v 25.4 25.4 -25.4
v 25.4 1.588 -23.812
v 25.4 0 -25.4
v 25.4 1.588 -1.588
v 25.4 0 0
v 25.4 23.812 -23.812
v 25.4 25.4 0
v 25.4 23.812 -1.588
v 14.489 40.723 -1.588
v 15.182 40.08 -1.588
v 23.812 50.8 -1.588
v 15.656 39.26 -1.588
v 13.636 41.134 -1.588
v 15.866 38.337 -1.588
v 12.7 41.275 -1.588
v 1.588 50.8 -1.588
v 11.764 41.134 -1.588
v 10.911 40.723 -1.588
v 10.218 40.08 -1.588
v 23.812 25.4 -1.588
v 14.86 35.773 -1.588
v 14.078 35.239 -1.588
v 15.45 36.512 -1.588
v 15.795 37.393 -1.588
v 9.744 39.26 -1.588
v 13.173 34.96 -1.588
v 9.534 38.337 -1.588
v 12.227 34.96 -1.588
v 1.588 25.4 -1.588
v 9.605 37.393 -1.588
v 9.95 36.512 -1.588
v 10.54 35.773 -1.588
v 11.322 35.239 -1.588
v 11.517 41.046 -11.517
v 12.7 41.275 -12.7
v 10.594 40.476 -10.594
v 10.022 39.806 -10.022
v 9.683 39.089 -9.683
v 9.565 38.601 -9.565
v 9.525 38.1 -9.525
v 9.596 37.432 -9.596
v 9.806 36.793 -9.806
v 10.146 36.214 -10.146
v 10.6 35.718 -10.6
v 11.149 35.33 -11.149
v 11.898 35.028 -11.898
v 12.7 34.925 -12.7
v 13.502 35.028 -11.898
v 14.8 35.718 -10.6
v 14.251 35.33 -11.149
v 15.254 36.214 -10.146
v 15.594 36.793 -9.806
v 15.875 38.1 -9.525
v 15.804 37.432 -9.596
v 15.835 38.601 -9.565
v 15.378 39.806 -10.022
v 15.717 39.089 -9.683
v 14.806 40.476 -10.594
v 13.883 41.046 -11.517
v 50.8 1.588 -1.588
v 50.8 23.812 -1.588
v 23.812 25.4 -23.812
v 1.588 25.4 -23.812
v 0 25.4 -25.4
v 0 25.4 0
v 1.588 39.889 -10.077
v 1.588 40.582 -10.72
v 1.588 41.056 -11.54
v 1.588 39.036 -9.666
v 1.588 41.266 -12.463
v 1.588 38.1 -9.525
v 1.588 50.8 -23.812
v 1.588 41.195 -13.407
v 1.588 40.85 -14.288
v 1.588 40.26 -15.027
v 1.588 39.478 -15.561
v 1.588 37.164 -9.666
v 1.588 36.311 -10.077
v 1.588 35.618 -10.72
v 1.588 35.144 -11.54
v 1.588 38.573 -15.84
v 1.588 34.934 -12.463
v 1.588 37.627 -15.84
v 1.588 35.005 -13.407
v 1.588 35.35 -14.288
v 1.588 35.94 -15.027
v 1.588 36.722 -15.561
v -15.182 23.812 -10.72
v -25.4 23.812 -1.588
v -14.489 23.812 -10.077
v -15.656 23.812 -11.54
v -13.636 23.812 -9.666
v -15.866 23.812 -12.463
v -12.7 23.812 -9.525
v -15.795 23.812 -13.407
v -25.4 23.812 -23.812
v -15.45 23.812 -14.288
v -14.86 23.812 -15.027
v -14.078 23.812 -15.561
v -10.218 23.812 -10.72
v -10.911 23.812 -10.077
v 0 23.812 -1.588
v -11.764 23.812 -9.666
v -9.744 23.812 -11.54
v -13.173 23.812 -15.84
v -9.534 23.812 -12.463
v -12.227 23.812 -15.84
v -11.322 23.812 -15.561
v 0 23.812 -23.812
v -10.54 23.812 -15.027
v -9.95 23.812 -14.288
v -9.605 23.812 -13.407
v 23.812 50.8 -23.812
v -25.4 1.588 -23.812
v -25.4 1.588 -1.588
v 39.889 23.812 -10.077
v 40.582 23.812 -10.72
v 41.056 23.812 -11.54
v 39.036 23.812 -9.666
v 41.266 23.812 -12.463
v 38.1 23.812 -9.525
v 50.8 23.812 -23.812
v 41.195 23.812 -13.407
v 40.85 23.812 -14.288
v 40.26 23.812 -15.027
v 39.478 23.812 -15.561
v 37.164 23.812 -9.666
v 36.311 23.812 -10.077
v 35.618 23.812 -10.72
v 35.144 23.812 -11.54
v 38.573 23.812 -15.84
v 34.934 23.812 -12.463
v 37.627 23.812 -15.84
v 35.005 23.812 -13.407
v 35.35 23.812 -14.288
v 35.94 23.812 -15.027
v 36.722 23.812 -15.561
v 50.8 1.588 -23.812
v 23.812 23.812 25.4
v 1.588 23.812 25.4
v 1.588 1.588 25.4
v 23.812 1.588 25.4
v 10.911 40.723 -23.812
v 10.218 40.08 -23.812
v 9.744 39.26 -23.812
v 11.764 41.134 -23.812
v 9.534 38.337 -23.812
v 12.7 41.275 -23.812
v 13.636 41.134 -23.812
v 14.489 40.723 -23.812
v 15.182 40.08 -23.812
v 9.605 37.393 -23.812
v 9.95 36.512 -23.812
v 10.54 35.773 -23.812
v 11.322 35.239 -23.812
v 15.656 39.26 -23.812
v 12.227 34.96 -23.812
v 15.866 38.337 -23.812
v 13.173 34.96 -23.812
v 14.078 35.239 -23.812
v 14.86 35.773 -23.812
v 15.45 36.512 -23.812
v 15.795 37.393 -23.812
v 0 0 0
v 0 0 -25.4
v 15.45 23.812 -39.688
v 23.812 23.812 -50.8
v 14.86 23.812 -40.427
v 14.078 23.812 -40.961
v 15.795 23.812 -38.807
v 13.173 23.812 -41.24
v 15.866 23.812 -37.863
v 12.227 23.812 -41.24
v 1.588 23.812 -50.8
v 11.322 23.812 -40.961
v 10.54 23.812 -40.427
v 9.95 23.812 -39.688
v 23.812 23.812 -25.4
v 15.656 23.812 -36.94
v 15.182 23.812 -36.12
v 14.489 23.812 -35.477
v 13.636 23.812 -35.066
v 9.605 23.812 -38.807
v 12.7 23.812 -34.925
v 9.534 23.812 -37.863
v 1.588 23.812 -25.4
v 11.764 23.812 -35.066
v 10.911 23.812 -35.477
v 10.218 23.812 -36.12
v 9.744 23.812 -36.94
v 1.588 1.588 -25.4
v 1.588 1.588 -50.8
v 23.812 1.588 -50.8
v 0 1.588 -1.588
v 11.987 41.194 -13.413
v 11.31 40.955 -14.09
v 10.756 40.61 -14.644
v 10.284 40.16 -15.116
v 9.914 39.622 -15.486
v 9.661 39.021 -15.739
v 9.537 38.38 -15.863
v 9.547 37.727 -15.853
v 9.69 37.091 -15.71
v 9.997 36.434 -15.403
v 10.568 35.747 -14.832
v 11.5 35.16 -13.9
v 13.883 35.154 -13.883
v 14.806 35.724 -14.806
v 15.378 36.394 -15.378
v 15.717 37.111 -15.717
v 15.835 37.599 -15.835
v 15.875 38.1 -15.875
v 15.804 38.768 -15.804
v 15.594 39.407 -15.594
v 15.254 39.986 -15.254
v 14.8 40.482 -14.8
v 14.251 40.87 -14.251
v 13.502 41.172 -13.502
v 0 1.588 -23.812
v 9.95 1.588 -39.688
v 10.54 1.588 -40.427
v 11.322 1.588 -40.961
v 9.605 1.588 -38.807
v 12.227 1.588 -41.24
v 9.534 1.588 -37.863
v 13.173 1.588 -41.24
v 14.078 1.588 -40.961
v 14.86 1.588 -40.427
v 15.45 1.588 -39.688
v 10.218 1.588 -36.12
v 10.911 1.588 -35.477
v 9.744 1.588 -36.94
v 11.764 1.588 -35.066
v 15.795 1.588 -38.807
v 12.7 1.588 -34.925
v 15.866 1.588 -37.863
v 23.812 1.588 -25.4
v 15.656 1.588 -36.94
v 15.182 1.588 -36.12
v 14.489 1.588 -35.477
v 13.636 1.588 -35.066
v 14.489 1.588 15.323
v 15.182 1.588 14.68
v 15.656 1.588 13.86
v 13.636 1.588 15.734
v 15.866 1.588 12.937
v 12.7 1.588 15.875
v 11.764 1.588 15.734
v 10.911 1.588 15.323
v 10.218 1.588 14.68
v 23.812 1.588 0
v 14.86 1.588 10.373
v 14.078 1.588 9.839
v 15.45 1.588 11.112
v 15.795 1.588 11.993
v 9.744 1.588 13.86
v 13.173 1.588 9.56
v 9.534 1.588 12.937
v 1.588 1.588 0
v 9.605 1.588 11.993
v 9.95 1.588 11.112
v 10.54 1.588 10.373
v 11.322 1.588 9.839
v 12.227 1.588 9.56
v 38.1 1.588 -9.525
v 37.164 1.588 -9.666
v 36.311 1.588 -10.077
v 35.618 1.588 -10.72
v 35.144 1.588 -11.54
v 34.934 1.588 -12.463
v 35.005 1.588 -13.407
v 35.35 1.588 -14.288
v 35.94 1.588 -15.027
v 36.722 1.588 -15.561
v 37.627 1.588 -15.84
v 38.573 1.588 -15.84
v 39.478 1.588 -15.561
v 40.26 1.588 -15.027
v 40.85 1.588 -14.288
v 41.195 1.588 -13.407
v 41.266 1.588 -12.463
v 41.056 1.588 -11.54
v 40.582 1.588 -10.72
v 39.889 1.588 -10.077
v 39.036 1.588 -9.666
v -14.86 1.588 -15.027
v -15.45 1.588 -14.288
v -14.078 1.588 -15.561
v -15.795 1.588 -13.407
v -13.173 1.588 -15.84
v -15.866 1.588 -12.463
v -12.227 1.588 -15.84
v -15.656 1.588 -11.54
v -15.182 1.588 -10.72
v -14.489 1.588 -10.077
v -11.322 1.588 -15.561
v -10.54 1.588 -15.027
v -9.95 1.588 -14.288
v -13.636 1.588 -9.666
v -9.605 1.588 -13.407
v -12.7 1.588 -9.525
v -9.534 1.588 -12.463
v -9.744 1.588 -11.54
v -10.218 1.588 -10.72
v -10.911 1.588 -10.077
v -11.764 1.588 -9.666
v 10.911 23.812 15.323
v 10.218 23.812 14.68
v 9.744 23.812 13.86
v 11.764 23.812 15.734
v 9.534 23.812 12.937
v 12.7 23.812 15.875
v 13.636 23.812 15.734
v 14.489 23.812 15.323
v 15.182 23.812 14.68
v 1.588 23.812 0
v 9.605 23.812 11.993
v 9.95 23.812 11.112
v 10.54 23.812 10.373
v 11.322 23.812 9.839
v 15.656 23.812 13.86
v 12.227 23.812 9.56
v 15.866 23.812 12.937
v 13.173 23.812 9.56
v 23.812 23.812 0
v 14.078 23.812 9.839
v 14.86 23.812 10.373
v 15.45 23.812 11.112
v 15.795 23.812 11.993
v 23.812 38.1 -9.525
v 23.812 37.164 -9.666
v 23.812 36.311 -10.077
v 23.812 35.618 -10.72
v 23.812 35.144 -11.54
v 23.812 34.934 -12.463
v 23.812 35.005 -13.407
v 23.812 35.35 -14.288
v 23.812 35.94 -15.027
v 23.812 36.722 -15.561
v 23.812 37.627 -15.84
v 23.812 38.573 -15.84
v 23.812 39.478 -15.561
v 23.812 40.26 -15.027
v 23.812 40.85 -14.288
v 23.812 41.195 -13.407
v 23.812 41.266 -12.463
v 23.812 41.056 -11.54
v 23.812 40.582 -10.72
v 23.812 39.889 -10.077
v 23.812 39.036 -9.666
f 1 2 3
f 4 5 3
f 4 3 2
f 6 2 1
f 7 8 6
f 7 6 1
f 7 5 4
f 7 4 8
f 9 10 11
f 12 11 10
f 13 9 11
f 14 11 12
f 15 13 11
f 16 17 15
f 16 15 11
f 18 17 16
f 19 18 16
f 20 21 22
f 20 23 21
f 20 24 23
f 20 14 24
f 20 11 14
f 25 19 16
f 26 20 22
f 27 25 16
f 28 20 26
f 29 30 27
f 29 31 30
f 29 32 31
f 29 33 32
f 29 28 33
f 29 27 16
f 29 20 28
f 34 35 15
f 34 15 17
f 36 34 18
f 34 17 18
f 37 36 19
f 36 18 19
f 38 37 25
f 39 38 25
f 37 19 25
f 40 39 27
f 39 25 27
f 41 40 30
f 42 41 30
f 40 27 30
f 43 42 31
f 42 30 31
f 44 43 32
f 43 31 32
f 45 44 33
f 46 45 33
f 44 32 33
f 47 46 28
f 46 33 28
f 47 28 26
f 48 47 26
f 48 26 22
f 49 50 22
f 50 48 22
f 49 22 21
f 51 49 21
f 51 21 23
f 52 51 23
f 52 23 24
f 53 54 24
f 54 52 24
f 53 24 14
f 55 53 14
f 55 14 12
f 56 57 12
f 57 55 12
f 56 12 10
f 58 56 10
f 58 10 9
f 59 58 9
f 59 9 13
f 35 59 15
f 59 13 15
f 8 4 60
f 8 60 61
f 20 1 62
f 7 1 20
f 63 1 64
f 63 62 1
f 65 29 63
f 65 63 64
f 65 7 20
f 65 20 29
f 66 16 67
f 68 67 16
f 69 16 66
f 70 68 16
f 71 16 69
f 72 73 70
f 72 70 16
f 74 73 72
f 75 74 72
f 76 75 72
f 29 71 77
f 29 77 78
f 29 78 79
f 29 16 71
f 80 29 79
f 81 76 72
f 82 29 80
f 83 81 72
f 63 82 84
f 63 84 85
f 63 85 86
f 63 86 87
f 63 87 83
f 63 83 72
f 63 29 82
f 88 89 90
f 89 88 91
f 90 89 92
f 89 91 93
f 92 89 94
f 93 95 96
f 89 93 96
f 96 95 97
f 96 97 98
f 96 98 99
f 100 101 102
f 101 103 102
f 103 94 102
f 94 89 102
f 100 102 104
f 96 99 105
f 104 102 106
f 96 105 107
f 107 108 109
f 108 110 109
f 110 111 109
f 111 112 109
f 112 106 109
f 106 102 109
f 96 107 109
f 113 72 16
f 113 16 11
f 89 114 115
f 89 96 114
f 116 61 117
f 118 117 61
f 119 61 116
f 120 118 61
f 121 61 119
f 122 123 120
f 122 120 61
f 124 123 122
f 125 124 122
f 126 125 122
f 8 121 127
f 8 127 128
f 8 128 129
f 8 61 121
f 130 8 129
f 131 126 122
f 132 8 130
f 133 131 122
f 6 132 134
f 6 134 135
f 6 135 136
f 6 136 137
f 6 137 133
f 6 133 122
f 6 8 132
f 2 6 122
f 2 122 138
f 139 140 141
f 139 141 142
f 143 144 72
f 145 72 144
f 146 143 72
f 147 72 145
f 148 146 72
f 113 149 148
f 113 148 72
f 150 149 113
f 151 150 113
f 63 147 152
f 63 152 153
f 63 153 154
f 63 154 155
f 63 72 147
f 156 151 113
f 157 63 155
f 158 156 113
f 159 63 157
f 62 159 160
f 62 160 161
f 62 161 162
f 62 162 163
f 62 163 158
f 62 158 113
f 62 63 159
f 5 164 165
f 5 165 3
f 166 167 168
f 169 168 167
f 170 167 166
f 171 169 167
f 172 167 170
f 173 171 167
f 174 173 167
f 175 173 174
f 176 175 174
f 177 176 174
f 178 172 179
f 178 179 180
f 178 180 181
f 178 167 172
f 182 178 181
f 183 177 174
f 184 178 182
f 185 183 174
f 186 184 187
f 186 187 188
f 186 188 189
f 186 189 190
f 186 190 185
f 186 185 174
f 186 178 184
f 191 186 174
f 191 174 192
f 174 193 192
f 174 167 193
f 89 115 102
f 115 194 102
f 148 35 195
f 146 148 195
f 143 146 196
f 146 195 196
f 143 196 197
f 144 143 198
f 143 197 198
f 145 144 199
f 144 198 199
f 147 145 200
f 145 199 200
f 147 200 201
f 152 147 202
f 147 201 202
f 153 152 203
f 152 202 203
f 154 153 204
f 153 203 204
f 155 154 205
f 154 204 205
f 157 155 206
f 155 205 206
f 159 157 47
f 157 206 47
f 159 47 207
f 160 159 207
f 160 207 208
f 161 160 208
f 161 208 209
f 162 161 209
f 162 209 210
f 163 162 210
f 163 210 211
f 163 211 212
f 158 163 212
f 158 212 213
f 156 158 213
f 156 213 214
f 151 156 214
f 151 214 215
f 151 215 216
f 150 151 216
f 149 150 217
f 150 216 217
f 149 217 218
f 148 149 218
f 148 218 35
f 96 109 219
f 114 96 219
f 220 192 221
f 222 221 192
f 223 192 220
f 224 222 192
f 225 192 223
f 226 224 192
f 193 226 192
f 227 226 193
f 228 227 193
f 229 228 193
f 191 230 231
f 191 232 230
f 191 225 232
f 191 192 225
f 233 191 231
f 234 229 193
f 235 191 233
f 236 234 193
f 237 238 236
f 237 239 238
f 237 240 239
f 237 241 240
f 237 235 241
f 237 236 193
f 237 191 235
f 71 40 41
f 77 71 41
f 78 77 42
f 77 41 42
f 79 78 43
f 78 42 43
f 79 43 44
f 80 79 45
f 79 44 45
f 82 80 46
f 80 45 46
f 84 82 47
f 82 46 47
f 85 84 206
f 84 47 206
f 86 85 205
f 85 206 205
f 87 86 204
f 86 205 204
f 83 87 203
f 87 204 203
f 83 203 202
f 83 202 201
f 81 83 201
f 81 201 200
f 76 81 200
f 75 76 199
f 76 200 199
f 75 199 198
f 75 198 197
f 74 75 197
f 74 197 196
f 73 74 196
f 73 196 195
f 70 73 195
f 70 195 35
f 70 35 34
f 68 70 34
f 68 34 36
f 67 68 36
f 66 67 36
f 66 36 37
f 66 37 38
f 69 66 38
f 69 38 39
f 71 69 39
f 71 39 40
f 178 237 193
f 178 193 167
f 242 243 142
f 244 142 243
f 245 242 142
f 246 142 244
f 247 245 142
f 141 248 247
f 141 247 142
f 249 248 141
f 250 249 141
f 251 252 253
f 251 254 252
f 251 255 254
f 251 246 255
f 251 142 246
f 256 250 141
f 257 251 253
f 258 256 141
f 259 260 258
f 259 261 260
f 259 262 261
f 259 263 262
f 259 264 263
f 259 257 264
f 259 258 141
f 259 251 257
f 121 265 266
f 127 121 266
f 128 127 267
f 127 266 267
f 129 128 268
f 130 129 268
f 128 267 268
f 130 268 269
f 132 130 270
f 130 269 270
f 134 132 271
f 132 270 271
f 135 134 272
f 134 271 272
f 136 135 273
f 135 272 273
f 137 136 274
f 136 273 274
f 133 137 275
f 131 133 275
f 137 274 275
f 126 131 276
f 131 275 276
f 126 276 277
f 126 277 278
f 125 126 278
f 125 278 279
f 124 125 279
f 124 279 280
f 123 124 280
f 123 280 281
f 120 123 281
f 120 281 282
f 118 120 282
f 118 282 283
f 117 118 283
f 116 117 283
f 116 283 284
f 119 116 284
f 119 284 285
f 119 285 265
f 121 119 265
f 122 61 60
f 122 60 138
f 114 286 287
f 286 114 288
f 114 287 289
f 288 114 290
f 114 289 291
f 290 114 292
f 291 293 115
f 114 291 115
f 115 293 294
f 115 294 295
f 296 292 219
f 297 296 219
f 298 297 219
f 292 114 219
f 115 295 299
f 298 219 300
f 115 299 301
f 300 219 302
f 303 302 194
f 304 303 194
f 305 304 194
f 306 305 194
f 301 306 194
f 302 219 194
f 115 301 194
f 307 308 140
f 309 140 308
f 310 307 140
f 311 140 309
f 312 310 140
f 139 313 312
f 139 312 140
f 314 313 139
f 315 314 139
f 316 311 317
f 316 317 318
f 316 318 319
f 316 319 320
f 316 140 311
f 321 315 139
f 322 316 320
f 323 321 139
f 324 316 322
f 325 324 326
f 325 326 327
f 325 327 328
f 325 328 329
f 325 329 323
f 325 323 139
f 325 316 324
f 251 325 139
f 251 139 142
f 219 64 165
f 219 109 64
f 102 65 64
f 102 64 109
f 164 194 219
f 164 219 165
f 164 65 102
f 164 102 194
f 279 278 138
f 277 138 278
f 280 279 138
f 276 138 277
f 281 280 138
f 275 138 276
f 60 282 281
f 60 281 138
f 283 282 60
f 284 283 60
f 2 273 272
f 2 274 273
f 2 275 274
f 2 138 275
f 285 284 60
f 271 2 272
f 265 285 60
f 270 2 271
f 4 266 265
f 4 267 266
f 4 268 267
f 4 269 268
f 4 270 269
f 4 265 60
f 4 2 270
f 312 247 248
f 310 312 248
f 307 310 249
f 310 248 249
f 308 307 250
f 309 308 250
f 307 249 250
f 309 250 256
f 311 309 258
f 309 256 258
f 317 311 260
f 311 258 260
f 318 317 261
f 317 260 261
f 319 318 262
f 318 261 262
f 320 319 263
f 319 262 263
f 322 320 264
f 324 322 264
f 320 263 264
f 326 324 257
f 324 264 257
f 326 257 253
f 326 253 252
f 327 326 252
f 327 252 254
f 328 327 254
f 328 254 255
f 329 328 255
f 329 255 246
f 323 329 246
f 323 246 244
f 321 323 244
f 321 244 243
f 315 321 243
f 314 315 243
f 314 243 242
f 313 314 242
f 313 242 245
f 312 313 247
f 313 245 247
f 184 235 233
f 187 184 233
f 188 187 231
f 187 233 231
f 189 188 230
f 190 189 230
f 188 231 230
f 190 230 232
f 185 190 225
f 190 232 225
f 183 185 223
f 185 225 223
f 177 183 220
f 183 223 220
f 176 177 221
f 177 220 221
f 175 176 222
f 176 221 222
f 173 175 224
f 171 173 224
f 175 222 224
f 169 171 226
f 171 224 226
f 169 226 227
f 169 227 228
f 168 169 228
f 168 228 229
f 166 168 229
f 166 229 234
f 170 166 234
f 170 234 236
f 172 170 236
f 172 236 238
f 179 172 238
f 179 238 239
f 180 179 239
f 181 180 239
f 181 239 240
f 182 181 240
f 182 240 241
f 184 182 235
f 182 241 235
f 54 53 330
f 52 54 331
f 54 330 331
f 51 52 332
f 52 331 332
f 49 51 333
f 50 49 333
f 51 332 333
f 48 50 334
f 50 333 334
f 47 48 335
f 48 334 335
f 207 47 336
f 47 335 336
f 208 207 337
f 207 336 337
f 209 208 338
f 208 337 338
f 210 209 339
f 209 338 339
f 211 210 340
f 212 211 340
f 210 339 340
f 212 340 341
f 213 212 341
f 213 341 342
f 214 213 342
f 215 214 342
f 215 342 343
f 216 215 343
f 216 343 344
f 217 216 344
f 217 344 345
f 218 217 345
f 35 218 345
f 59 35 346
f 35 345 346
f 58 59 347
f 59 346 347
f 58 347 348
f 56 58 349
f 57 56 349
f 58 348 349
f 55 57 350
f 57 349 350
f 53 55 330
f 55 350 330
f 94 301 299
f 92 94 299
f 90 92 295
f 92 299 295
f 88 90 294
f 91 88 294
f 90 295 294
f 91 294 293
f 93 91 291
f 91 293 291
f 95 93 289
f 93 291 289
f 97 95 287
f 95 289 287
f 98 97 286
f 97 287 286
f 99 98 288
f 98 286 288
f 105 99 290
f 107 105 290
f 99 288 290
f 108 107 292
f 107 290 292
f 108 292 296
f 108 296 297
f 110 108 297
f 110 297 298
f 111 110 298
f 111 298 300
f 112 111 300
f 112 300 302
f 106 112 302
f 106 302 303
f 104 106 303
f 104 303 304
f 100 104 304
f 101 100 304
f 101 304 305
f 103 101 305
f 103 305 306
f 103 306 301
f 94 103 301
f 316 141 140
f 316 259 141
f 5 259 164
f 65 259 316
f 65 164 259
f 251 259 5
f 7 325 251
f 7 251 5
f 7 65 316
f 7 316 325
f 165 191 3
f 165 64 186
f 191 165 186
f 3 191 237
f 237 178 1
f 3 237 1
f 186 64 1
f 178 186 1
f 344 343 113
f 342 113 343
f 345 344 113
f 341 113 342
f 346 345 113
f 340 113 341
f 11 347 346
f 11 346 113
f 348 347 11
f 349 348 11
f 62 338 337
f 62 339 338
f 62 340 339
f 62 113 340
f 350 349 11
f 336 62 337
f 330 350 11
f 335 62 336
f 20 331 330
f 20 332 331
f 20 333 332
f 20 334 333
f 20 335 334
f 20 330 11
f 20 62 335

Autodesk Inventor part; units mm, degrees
ref_plane "YZ Plane" through (0, 0, 0) normal (1, 0, 0) x (0, 1, 0)
ref_plane "XZ Plane" through (0, 0, 0) normal (0, 1, 0) x (-1, 0, 0)
ref_plane "XY Plane" through (0, 0, 0) normal (0, 0, 1) x (1, 0, 0)
sketch "Sketch1" plane through (0, 0, 0) normal (0, 0, 1) x (1, 0, 0)
  line L0 (0, 0) -> (25.4, 0)
  line L1 (25.4, 0) -> (25.4, 25.4)
  line L2 (25.4, 25.4) -> (0, 25.4)
  line L3 (0, 25.4) -> (0, 0)
  line L4 (1.5875, 23.8125) -> (23.8125, 23.8125)
  line L5 (23.8125, 23.8125) -> (23.8125, 1.5875)
  line L6 (23.8125, 1.5875) -> (1.5875, 1.5875)
  line L7 (1.5875, 1.5875) -> (1.5875, 23.8125)
  dimension "d0" = 25.4
  dimension "d1" = 25.4
  dimension "d4" = 1.5875
extrude "Extrusion1" add sketch "Sketch1" against normal blind 25.4 contours L3 L2 L1 L0 | L4 L5 L6 L7
extrude "Extrusion2" add sketch "Sketch1" along normal blind 25.4 contours L4 L5 L6 L7
sketch "Sketch2" plane through (25.4, 0, 0) normal (1, 0, 0) x (0, 0, -1)
  line L0 (25.4, 0) -> (25.4, 25.4) projected
  line L1 (0, 25.4) -> (25.4, 25.4) projected
  line L2 (0, 0) -> (0, 25.4) projected
  line L3 (0, 0) -> (25.4, 0) projected
  line L4 (23.8125, 23.8125) -> (23.8125, 1.5875)
  line L5 (23.8125, 1.5875) -> (1.5875, 1.5875)
  line L6 (1.5875, 1.5875) -> (1.5875, 23.8125)
  line L7 (1.5875, 23.8125) -> (23.8125, 23.8125)
  dimension "d8" = 1.5875
sketch "Sketch3" plane through (0, 25.4, 0) normal (0, 1, 0) x (1, 0, 0)
  line L0 (25.4, 25.4) -> (0, 25.4) projected
  line L1 (0, 0) -> (0, 25.4) projected
  line L2 (25.4, 0) -> (0, 0) projected
  line L3 (25.4, 0) -> (25.4, 25.4) projected
  line L4 (1.5875, 23.8125) -> (23.8125, 23.8125)
  line L5 (23.8125, 23.8125) -> (23.8125, 1.5875)
  line L6 (23.8125, 1.5875) -> (1.5875, 1.5875)
  line L7 (1.5875, 1.5875) -> (1.5875, 23.8125)
  dimension "d9" = 1.5875
extrude "Extrusion3" add sketch "Sketch2" along normal blind 25.4 contours L4 L5 L6 L7
extrude "Extrusion4" add sketch "Sketch3" along normal blind 25.4 contours L4 L5 L6 L7
sketch "Sketch4" plane through (0, 0, 0) normal (-1, 0, 0) x (0, 0, 1)
  line L0 (-25.4, 25.4) -> (-25.4, 0) projected
  line L1 (0, 0) -> (-25.4, 0) projected
  line L2 (0, 25.4) -> (0, 0) projected
  line L3 (0, 25.4) -> (-25.4, 25.4) projected
  line L4 (-23.8125, 23.8125) -> (-23.8125, 1.5875)
  line L5 (-23.8125, 1.5875) -> (-1.5875, 1.5875)
  line L6 (-1.5875, 1.5875) -> (-1.5875, 23.8125)
  line L7 (-1.5875, 23.8125) -> (-23.8125, 23.8125)
  dimension "d15" = 1.5875
extrude "Extrusion5" add sketch "Sketch4" along normal blind 25.4 contours L7 L6 L5 L4
sketch "Sketch5" plane through (0, 0, -25.4) normal (0, 0, -1) x (-1, 0, 0)
  line L0 (-25.4, 0) -> (-25.4, 25.4) projected
  line L1 (0, 0) -> (-25.4, 0) projected
  line L2 (0, 25.4) -> (0, 0) projected
  line L3 (-25.4, 25.4) -> (0, 25.4) projected
  line L4 (-1.5875, 23.8125) -> (-1.5875, 1.5875)
  line L5 (-1.5875, 1.5875) -> (-23.8125, 1.5875)
  line L6 (-23.8125, 1.5875) -> (-23.8125, 23.8125)
  line L7 (-23.8125, 23.8125) -> (-1.5875, 23.8125)
  dimension "d18" = 1.5875
extrude "Extrusion6" add sketch "Sketch5" along normal blind 25.4 contours L4 L5 L6 L7
sketch "Sketch7" plane through (1.5875, 23.8125, -25.4) normal (0, 1, 0) x (1, 0, 0)
  line L0 (22.225, 0) -> (0, 0) projected
  line L1 (23.8125, -25.4) -> (-1.5875, -25.4) projected
  line L2 (23.8125, -25.4) -> (23.8125, 0) projected
  point P0 (11.1125, -38.1)
  point P1 (-14.2875, -12.7)
  point P2 (11.1125, 12.7)
  point P3 (36.5125, -12.7)
  dimension "d26" = 12.7
  dimension "d28" = 12.7
  dimension "d29" = 12.7
  dimension "d52" = 12.7
  dimension "d53" = 50.8
hole "Hole1" at (12.7, 23.8125, 12.7) at (-12.7, 23.8125, -12.7) at (12.7, 23.8125, -38.1) at (38.1, 23.8125, -12.7) direction (0, -1, 0) diameter 6.35 depth 25.4 tip angle 118
sketch "Sketch8" plane through (1.5875, 25.4, -23.8125) normal (-1, 0, 0) x (0, 0, 1)
  point P0 (23.8125, -25.4)
  point P1 (11.1125, 12.7)
hole "Hole2" at (1.5875, 38.1, -12.7) direction (1, 0, 0) diameter 6.35 depth 25.4 tip angle 118
sketch "Sketch9" plane through (23.8125, 25.4, -23.8125) normal (0, 0, -1) x (-1, 0, 0)
  point P0 (23.8125, -25.4)
  point P1 (11.1125, 12.7)
hole "Hole3" at (12.7, 38.1, -23.8125) direction (0, 0, 1) diameter 6.35 depth 25.4 tip angle 118
properties part number "5-way corner"
